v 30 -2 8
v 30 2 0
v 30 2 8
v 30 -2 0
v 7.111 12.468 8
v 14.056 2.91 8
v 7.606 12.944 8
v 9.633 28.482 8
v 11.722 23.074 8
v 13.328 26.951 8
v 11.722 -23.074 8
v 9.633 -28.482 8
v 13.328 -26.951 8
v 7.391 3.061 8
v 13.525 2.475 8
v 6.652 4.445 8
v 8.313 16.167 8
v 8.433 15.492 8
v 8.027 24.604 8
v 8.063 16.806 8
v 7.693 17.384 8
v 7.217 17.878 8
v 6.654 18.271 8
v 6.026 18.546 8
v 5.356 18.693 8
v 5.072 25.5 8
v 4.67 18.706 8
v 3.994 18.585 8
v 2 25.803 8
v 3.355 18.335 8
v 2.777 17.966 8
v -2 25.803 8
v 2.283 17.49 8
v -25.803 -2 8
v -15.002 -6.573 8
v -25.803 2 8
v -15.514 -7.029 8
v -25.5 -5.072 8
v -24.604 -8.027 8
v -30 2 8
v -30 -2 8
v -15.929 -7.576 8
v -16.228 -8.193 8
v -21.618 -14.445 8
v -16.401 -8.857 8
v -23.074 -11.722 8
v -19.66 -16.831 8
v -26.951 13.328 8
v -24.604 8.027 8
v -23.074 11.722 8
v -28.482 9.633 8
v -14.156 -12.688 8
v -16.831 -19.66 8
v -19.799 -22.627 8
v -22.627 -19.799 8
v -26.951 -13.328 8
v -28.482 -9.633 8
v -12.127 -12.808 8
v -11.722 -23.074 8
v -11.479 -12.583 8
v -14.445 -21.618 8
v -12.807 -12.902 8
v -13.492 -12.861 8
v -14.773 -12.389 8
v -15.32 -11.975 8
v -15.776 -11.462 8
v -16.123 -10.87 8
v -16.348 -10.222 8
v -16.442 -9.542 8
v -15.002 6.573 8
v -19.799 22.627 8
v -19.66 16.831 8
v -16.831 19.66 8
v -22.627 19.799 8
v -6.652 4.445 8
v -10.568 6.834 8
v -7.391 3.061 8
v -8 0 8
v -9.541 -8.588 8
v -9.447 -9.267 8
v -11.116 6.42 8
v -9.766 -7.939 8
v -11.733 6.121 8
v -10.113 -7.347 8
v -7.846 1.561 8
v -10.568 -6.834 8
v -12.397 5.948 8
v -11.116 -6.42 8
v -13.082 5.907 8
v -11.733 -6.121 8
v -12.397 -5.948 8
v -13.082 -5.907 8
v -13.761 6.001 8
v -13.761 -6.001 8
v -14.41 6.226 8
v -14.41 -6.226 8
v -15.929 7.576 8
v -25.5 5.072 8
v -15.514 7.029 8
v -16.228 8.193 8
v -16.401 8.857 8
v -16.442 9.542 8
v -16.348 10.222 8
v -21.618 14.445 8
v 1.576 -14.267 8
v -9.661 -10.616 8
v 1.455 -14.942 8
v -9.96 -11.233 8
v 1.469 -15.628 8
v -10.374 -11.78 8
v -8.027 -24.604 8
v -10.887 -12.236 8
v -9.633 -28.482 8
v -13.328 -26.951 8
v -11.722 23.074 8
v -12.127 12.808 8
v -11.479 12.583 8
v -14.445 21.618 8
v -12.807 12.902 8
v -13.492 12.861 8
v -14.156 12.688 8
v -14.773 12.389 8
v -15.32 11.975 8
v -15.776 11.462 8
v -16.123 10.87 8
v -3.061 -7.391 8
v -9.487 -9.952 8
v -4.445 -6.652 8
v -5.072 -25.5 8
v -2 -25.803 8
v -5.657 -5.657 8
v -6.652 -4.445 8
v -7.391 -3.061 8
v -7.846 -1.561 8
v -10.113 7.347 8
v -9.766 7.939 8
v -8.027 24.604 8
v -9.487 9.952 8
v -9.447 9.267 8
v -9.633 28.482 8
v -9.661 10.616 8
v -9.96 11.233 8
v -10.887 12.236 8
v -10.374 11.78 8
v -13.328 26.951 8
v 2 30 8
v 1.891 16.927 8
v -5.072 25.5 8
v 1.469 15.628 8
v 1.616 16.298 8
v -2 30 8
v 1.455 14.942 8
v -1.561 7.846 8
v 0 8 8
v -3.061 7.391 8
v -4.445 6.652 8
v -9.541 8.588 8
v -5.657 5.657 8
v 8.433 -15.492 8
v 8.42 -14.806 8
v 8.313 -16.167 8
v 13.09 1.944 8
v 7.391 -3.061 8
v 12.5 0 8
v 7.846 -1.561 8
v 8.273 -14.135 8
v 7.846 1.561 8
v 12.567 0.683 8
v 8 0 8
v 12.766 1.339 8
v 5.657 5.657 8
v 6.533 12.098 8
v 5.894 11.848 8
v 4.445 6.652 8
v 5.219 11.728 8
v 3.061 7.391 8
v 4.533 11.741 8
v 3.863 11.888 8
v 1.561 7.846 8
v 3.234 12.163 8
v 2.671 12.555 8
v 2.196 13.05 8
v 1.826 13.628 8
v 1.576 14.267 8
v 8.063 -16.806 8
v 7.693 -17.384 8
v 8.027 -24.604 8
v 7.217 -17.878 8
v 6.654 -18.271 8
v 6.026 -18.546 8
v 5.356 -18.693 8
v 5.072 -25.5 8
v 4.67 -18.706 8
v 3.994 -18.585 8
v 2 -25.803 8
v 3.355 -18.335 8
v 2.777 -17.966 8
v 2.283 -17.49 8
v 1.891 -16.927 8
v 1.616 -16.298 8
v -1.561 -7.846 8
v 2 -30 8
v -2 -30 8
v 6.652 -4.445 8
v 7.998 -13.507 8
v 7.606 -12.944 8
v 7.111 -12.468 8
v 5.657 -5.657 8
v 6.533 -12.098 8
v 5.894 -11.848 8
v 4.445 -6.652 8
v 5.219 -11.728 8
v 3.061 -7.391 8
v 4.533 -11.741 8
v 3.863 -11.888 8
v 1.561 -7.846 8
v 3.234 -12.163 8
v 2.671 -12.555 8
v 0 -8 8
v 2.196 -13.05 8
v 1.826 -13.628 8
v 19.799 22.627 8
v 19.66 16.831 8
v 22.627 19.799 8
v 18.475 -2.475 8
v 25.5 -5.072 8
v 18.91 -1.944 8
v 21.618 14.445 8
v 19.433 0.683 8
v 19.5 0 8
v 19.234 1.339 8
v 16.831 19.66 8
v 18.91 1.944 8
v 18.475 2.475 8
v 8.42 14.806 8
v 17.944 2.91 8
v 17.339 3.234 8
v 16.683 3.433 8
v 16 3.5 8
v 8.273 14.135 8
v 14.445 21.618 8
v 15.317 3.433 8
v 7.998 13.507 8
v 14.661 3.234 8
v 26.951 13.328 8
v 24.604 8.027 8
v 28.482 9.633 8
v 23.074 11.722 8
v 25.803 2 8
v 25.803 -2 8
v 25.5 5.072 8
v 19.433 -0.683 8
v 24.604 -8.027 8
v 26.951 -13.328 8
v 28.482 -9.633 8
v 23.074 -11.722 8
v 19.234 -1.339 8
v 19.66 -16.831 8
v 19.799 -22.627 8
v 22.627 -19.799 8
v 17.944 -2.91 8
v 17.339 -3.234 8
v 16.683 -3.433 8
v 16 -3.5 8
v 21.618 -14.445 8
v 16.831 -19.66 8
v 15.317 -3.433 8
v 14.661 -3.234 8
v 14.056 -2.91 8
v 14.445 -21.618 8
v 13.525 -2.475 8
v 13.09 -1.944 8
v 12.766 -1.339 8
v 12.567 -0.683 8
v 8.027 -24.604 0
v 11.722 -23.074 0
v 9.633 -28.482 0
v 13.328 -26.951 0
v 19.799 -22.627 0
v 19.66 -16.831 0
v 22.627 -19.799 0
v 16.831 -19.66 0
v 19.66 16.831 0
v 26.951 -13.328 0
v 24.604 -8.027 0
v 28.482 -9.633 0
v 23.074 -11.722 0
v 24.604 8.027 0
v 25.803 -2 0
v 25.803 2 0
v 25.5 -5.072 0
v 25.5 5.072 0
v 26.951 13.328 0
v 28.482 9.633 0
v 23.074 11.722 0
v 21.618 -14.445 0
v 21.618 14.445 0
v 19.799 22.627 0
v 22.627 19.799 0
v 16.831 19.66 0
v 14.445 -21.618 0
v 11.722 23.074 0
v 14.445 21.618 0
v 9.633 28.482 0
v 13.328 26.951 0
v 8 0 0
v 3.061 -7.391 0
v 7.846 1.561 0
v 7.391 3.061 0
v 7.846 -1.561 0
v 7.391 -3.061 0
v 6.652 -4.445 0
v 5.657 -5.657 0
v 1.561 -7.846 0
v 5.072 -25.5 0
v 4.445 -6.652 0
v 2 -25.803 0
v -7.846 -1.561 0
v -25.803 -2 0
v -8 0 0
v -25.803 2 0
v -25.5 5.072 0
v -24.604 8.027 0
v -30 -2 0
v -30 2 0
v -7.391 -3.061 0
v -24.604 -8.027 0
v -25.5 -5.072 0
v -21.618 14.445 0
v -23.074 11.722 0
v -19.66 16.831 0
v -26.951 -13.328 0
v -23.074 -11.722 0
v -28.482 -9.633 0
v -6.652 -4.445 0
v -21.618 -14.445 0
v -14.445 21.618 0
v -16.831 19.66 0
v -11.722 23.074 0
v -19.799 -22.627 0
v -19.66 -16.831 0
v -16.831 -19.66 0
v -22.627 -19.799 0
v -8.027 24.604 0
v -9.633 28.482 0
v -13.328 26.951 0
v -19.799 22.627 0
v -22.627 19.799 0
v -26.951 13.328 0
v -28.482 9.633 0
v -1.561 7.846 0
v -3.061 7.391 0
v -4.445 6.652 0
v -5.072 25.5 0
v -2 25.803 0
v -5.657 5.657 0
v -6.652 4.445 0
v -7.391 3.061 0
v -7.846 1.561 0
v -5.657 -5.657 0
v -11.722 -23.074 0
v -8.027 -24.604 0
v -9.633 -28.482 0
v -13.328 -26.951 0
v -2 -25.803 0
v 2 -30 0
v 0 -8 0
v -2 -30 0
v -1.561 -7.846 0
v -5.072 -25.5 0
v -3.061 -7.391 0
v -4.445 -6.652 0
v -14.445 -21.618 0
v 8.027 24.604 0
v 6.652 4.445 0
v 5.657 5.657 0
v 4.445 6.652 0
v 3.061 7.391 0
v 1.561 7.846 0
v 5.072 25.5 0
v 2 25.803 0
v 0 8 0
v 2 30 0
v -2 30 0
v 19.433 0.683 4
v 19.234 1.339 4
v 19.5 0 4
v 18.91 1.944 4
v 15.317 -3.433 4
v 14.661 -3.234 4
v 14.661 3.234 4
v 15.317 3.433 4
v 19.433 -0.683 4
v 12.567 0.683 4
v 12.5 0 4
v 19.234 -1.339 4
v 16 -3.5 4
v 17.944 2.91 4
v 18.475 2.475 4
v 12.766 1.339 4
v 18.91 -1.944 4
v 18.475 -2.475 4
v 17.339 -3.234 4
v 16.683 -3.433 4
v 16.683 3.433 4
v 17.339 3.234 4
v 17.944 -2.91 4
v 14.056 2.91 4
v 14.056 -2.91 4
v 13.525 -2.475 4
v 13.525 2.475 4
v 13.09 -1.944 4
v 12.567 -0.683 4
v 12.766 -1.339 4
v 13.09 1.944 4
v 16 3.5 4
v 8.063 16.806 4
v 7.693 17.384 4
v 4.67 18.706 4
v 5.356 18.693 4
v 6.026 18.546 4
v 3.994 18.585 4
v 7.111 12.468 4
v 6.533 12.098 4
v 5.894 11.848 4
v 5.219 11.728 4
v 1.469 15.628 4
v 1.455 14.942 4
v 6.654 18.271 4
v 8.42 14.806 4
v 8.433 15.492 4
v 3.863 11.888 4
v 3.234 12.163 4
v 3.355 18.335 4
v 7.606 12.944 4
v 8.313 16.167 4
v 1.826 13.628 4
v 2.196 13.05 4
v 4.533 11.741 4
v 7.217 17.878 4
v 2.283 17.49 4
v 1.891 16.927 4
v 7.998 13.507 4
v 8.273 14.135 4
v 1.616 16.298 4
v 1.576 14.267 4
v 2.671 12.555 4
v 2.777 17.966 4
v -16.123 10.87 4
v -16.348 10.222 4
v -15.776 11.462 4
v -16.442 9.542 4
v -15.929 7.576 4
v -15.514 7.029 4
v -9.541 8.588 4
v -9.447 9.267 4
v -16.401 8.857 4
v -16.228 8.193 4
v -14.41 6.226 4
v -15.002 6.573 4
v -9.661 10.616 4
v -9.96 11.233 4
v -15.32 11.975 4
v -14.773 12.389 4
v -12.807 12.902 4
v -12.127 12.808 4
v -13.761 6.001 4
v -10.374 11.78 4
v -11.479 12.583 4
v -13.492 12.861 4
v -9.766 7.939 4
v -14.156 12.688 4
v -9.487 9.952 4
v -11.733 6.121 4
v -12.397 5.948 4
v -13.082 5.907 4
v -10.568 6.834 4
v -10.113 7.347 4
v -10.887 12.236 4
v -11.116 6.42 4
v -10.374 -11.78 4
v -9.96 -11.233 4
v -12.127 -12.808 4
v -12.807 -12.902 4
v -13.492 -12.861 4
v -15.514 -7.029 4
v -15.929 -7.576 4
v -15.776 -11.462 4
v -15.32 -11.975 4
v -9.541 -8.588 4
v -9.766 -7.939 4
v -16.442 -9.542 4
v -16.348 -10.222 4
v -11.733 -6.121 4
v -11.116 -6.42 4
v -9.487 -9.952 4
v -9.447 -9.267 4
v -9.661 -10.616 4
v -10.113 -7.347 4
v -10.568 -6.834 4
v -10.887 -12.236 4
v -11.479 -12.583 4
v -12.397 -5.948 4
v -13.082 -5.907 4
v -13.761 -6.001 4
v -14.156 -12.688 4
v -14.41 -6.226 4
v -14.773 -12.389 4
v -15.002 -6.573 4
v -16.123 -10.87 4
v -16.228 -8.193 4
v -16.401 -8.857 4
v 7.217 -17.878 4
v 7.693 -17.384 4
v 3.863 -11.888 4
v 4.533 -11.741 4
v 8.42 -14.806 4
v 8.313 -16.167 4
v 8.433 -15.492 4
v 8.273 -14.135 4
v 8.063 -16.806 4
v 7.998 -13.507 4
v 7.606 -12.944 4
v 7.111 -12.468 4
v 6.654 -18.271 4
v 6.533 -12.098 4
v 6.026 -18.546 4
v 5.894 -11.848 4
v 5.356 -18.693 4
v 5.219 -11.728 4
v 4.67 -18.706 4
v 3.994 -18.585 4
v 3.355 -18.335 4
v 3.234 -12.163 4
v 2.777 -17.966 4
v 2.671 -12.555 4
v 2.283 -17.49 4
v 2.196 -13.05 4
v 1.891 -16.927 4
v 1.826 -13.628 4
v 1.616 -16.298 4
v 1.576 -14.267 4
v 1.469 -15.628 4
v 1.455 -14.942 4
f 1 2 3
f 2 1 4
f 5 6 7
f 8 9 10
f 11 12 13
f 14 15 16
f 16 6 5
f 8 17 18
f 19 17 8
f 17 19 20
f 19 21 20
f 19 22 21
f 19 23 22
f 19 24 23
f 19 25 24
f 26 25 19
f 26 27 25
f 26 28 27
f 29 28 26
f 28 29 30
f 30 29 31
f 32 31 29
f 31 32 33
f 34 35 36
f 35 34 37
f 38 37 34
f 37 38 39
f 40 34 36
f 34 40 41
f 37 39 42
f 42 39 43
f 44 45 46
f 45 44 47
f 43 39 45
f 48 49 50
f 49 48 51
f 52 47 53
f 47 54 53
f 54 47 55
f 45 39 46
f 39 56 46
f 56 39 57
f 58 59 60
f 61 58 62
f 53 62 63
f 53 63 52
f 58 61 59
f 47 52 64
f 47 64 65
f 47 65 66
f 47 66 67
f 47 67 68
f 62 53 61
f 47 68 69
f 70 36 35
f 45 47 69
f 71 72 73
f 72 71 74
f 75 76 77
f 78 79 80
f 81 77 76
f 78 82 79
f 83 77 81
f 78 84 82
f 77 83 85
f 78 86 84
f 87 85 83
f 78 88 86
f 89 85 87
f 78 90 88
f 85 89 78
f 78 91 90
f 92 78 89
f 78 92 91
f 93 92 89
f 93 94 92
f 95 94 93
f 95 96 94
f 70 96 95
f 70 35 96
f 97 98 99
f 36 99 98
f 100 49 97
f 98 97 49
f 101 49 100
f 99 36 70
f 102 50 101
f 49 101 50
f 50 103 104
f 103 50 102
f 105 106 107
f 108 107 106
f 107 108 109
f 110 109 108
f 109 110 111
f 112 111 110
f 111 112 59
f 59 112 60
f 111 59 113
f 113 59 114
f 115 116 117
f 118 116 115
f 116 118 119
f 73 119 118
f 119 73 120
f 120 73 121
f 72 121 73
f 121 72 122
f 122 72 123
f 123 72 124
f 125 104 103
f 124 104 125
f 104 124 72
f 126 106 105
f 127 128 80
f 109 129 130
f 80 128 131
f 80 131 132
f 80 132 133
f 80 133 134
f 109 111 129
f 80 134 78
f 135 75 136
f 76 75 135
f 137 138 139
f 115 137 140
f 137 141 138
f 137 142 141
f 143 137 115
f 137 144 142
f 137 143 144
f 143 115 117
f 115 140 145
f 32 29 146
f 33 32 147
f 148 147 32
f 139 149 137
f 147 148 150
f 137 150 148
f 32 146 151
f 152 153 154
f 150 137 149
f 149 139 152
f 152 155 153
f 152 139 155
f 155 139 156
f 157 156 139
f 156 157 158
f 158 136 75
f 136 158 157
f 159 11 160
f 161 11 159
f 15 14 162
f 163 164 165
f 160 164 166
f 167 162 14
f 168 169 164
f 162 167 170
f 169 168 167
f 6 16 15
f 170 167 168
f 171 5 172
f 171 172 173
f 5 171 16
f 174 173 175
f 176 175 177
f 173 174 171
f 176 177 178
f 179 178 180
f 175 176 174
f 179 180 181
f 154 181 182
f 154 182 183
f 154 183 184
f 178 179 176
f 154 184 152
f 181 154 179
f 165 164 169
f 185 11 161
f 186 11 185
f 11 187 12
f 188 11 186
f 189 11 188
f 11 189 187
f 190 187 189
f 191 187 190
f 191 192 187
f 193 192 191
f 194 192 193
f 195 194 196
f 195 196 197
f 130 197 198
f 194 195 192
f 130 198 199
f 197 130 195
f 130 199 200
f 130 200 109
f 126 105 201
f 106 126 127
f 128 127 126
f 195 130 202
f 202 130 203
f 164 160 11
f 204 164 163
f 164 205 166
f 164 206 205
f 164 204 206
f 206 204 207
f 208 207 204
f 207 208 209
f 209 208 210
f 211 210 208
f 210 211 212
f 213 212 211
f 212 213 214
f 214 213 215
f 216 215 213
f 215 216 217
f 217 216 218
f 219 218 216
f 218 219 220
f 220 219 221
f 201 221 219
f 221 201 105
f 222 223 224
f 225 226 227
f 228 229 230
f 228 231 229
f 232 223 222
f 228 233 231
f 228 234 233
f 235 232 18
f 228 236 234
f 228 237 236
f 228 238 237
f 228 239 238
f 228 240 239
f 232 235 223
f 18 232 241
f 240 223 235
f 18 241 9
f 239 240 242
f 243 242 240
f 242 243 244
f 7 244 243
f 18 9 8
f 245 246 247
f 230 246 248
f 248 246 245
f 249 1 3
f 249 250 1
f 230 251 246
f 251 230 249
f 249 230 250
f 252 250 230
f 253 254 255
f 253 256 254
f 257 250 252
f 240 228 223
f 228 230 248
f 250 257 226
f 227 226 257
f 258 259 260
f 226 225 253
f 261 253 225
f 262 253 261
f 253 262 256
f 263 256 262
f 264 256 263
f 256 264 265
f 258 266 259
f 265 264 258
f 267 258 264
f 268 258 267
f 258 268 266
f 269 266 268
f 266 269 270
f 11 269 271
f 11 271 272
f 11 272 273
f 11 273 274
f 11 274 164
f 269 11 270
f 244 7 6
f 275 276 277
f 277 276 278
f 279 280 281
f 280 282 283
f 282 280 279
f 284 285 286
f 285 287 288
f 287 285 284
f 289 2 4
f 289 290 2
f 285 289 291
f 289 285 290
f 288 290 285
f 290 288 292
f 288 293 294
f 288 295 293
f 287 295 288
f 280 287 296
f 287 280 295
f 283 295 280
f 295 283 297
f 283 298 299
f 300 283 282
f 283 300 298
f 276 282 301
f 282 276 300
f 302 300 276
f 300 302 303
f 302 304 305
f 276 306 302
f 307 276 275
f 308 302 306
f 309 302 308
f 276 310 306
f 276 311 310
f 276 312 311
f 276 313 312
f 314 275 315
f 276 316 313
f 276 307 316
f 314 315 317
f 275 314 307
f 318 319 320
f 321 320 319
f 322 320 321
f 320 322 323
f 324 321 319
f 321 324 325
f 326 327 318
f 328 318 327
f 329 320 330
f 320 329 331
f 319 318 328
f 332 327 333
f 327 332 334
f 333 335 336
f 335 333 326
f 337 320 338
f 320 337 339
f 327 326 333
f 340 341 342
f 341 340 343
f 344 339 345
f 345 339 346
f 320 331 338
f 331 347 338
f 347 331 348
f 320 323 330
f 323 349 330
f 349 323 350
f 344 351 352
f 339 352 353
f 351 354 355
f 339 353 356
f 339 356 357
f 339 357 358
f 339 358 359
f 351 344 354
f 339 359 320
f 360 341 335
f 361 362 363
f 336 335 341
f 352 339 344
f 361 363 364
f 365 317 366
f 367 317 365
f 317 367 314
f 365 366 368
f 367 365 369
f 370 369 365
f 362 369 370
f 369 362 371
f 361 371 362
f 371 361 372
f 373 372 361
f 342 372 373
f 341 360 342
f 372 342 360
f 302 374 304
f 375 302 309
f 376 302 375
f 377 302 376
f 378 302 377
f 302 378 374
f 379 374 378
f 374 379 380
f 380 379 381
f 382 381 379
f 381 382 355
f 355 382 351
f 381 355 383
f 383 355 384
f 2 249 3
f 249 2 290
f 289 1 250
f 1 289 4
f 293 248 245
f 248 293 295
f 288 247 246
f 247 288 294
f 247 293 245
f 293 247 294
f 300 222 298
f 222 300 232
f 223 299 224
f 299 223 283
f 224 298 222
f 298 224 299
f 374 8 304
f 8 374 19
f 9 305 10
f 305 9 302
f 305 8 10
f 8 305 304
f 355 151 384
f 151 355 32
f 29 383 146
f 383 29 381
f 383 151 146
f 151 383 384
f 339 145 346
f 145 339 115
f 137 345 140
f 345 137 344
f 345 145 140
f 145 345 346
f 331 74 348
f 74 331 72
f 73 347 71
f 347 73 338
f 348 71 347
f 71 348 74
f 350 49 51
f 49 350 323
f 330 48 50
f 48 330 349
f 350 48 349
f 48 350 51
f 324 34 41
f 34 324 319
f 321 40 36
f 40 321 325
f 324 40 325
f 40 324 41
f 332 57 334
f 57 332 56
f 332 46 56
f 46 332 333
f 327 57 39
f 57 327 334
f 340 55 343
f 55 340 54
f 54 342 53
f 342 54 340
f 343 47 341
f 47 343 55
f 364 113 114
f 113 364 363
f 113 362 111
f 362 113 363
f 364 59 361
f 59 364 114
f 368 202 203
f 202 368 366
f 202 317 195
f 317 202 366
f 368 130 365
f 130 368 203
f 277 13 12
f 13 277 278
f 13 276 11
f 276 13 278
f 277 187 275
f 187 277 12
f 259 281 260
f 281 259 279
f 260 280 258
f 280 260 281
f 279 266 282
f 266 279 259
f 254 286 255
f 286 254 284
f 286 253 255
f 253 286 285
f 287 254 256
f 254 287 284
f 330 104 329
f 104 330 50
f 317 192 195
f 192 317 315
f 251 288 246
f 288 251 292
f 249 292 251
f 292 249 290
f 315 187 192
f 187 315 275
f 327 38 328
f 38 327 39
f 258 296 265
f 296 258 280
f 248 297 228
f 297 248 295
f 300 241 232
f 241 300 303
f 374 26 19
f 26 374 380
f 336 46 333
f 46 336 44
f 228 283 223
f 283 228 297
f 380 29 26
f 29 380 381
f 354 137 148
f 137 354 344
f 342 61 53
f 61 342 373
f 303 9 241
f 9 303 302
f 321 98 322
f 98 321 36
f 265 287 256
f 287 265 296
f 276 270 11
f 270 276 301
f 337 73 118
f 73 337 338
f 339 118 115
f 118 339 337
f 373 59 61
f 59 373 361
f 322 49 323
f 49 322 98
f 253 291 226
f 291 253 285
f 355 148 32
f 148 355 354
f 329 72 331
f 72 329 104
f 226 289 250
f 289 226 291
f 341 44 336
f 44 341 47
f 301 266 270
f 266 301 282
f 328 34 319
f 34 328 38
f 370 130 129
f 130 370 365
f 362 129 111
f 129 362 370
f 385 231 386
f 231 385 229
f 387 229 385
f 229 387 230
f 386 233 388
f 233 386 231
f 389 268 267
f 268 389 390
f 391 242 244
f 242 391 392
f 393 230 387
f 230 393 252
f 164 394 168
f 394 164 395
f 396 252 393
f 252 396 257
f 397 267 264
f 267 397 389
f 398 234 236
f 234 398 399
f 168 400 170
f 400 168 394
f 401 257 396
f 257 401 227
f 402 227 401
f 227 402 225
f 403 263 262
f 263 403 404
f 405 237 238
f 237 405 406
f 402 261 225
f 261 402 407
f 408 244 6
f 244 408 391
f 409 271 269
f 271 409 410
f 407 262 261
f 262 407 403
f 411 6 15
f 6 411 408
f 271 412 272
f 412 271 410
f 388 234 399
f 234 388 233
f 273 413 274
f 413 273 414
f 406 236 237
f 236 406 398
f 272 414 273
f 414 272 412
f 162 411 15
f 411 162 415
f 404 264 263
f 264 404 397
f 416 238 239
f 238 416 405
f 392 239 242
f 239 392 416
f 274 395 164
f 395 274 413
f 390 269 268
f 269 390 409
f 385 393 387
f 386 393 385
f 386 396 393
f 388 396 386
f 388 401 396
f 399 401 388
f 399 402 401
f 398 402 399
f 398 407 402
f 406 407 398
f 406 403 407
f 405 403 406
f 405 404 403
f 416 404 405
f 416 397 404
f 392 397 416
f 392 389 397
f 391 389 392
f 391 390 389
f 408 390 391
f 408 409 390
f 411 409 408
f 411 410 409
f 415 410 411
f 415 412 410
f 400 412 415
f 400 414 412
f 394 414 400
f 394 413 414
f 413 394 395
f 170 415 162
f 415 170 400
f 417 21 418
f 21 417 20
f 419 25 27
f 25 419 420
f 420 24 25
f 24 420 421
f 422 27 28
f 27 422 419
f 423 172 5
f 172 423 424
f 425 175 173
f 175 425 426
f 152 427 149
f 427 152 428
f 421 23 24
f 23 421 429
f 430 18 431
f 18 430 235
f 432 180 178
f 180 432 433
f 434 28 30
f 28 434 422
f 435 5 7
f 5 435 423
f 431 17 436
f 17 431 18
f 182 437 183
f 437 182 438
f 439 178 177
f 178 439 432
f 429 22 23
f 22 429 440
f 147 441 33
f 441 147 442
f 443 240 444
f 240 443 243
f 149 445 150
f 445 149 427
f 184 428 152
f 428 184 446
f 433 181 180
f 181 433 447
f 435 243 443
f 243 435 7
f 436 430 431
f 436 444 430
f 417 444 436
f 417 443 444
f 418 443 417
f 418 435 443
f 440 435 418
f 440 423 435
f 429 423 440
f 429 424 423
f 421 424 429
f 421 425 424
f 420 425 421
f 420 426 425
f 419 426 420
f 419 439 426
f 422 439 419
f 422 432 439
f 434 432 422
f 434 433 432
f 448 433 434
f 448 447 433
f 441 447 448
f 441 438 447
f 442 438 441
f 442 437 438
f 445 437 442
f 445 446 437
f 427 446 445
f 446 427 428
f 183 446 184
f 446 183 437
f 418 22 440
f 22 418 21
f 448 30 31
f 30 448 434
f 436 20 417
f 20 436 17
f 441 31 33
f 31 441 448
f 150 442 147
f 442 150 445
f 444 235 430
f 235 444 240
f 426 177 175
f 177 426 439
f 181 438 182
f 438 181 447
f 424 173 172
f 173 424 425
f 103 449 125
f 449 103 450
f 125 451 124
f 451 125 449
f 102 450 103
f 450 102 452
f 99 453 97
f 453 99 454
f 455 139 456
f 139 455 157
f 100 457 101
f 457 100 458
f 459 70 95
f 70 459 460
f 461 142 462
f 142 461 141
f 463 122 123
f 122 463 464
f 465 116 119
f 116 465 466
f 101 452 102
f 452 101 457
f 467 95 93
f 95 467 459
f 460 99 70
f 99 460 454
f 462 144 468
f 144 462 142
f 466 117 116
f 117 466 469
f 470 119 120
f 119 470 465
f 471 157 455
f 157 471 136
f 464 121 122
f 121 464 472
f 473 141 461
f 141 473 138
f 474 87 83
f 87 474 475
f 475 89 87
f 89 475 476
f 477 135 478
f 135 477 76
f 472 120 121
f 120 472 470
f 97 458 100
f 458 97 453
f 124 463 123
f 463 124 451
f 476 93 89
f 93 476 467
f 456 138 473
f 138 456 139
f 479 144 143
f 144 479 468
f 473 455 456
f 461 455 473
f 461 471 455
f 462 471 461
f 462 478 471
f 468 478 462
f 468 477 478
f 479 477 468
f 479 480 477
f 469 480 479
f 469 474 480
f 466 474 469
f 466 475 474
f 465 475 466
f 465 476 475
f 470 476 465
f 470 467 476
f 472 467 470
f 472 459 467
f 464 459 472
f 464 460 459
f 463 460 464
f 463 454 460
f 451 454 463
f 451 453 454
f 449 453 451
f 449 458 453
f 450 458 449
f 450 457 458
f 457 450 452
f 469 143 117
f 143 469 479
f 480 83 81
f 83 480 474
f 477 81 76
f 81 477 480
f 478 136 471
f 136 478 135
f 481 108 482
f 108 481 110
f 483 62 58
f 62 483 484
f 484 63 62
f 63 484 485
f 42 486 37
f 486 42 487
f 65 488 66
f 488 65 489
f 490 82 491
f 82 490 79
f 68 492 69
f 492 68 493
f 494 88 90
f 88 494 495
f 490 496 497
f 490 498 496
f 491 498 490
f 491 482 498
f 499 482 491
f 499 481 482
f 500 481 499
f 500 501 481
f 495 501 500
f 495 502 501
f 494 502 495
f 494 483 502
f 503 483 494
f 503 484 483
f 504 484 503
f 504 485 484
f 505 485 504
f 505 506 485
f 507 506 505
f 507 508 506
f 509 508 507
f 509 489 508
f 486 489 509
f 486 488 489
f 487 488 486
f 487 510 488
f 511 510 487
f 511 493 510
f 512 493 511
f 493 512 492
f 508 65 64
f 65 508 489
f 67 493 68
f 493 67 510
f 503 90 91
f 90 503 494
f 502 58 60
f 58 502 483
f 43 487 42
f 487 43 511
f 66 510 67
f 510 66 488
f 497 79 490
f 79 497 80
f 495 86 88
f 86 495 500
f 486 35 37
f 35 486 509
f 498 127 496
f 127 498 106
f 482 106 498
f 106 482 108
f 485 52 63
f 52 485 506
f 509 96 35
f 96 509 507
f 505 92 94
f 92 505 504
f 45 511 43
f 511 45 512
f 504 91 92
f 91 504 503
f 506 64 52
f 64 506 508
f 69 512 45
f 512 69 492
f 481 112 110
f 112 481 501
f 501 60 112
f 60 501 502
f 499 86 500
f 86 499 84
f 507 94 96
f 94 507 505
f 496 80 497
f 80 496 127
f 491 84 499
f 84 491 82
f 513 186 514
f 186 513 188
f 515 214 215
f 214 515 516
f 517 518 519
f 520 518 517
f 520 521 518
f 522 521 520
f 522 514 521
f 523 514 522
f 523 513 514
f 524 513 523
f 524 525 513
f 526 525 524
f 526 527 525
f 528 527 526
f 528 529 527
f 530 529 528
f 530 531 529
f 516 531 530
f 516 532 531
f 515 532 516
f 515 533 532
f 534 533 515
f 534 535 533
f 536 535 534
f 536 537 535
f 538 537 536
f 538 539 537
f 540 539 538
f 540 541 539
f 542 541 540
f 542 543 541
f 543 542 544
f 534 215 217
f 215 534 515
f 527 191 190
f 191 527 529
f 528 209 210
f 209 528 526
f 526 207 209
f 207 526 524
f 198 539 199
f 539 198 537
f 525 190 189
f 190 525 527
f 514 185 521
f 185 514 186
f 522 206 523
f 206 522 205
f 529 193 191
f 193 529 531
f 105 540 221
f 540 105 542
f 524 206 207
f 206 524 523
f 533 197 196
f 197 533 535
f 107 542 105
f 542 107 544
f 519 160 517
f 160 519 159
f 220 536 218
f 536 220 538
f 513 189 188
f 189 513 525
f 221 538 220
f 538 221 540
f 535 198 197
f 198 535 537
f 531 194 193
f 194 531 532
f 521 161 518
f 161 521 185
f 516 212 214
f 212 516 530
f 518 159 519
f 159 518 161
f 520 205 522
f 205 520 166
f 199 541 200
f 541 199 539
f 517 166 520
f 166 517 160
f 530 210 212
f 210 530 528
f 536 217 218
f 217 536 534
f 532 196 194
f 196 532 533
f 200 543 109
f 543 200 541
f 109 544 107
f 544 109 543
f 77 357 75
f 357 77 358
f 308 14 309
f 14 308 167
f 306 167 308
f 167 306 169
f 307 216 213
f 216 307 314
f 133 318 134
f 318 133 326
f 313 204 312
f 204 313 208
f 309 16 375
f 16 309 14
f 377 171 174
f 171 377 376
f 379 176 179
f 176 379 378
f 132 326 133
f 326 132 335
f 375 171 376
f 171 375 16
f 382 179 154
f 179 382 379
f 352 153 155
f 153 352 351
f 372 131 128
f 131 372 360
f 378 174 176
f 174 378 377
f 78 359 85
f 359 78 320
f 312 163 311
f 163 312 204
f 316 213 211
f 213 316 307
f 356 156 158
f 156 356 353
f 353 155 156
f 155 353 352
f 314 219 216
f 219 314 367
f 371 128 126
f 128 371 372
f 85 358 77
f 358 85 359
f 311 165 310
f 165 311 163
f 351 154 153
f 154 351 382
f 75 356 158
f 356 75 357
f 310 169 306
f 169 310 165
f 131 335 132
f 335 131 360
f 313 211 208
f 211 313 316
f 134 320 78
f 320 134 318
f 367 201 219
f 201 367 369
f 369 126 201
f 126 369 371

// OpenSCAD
$fn = 32;

// ----------------------------------------------------------------------
// Spur blank: lightened gear blank
// ----------------------------------------------------------------------

// --- parameters (mm) ---
disc_r = 26;              // blank root radius
disc_t = 8;               // blank thickness
n_teeth = 16;             // stub tooth count
tooth_w = 4;              // tooth width at the root
tooth_h = 4;              // tooth height above the root
bore_r = 8;               // central bore radius
ring_r = 16;              // lightening pocket ring radius
pocket_r = 3.5;           // lightening pocket radius

out_r = disc_r + tooth_h;  // tip radius
bbox_x = 60.0;  // measured width over the teeth
bbox_y = 60.0;  // measured depth over the teeth

difference() {
union() {
  cylinder(r = disc_r, h = disc_t);
  for (i = [0 : n_teeth - 1])
    rotate([0, 0, i * 360 / n_teeth])
      translate([disc_r - 1, -tooth_w / 2, 0])
        cube([tooth_h + 1, tooth_w, disc_t]);
}
  translate([0, 0, -1]) cylinder(r = bore_r, h = disc_t + 2);
  for (i = [0 : 5])
    rotate([0, 0, i * 72])
      translate([ring_r, 0, disc_t - 4])
        cylinder(r = pocket_r, h = 5);
}
